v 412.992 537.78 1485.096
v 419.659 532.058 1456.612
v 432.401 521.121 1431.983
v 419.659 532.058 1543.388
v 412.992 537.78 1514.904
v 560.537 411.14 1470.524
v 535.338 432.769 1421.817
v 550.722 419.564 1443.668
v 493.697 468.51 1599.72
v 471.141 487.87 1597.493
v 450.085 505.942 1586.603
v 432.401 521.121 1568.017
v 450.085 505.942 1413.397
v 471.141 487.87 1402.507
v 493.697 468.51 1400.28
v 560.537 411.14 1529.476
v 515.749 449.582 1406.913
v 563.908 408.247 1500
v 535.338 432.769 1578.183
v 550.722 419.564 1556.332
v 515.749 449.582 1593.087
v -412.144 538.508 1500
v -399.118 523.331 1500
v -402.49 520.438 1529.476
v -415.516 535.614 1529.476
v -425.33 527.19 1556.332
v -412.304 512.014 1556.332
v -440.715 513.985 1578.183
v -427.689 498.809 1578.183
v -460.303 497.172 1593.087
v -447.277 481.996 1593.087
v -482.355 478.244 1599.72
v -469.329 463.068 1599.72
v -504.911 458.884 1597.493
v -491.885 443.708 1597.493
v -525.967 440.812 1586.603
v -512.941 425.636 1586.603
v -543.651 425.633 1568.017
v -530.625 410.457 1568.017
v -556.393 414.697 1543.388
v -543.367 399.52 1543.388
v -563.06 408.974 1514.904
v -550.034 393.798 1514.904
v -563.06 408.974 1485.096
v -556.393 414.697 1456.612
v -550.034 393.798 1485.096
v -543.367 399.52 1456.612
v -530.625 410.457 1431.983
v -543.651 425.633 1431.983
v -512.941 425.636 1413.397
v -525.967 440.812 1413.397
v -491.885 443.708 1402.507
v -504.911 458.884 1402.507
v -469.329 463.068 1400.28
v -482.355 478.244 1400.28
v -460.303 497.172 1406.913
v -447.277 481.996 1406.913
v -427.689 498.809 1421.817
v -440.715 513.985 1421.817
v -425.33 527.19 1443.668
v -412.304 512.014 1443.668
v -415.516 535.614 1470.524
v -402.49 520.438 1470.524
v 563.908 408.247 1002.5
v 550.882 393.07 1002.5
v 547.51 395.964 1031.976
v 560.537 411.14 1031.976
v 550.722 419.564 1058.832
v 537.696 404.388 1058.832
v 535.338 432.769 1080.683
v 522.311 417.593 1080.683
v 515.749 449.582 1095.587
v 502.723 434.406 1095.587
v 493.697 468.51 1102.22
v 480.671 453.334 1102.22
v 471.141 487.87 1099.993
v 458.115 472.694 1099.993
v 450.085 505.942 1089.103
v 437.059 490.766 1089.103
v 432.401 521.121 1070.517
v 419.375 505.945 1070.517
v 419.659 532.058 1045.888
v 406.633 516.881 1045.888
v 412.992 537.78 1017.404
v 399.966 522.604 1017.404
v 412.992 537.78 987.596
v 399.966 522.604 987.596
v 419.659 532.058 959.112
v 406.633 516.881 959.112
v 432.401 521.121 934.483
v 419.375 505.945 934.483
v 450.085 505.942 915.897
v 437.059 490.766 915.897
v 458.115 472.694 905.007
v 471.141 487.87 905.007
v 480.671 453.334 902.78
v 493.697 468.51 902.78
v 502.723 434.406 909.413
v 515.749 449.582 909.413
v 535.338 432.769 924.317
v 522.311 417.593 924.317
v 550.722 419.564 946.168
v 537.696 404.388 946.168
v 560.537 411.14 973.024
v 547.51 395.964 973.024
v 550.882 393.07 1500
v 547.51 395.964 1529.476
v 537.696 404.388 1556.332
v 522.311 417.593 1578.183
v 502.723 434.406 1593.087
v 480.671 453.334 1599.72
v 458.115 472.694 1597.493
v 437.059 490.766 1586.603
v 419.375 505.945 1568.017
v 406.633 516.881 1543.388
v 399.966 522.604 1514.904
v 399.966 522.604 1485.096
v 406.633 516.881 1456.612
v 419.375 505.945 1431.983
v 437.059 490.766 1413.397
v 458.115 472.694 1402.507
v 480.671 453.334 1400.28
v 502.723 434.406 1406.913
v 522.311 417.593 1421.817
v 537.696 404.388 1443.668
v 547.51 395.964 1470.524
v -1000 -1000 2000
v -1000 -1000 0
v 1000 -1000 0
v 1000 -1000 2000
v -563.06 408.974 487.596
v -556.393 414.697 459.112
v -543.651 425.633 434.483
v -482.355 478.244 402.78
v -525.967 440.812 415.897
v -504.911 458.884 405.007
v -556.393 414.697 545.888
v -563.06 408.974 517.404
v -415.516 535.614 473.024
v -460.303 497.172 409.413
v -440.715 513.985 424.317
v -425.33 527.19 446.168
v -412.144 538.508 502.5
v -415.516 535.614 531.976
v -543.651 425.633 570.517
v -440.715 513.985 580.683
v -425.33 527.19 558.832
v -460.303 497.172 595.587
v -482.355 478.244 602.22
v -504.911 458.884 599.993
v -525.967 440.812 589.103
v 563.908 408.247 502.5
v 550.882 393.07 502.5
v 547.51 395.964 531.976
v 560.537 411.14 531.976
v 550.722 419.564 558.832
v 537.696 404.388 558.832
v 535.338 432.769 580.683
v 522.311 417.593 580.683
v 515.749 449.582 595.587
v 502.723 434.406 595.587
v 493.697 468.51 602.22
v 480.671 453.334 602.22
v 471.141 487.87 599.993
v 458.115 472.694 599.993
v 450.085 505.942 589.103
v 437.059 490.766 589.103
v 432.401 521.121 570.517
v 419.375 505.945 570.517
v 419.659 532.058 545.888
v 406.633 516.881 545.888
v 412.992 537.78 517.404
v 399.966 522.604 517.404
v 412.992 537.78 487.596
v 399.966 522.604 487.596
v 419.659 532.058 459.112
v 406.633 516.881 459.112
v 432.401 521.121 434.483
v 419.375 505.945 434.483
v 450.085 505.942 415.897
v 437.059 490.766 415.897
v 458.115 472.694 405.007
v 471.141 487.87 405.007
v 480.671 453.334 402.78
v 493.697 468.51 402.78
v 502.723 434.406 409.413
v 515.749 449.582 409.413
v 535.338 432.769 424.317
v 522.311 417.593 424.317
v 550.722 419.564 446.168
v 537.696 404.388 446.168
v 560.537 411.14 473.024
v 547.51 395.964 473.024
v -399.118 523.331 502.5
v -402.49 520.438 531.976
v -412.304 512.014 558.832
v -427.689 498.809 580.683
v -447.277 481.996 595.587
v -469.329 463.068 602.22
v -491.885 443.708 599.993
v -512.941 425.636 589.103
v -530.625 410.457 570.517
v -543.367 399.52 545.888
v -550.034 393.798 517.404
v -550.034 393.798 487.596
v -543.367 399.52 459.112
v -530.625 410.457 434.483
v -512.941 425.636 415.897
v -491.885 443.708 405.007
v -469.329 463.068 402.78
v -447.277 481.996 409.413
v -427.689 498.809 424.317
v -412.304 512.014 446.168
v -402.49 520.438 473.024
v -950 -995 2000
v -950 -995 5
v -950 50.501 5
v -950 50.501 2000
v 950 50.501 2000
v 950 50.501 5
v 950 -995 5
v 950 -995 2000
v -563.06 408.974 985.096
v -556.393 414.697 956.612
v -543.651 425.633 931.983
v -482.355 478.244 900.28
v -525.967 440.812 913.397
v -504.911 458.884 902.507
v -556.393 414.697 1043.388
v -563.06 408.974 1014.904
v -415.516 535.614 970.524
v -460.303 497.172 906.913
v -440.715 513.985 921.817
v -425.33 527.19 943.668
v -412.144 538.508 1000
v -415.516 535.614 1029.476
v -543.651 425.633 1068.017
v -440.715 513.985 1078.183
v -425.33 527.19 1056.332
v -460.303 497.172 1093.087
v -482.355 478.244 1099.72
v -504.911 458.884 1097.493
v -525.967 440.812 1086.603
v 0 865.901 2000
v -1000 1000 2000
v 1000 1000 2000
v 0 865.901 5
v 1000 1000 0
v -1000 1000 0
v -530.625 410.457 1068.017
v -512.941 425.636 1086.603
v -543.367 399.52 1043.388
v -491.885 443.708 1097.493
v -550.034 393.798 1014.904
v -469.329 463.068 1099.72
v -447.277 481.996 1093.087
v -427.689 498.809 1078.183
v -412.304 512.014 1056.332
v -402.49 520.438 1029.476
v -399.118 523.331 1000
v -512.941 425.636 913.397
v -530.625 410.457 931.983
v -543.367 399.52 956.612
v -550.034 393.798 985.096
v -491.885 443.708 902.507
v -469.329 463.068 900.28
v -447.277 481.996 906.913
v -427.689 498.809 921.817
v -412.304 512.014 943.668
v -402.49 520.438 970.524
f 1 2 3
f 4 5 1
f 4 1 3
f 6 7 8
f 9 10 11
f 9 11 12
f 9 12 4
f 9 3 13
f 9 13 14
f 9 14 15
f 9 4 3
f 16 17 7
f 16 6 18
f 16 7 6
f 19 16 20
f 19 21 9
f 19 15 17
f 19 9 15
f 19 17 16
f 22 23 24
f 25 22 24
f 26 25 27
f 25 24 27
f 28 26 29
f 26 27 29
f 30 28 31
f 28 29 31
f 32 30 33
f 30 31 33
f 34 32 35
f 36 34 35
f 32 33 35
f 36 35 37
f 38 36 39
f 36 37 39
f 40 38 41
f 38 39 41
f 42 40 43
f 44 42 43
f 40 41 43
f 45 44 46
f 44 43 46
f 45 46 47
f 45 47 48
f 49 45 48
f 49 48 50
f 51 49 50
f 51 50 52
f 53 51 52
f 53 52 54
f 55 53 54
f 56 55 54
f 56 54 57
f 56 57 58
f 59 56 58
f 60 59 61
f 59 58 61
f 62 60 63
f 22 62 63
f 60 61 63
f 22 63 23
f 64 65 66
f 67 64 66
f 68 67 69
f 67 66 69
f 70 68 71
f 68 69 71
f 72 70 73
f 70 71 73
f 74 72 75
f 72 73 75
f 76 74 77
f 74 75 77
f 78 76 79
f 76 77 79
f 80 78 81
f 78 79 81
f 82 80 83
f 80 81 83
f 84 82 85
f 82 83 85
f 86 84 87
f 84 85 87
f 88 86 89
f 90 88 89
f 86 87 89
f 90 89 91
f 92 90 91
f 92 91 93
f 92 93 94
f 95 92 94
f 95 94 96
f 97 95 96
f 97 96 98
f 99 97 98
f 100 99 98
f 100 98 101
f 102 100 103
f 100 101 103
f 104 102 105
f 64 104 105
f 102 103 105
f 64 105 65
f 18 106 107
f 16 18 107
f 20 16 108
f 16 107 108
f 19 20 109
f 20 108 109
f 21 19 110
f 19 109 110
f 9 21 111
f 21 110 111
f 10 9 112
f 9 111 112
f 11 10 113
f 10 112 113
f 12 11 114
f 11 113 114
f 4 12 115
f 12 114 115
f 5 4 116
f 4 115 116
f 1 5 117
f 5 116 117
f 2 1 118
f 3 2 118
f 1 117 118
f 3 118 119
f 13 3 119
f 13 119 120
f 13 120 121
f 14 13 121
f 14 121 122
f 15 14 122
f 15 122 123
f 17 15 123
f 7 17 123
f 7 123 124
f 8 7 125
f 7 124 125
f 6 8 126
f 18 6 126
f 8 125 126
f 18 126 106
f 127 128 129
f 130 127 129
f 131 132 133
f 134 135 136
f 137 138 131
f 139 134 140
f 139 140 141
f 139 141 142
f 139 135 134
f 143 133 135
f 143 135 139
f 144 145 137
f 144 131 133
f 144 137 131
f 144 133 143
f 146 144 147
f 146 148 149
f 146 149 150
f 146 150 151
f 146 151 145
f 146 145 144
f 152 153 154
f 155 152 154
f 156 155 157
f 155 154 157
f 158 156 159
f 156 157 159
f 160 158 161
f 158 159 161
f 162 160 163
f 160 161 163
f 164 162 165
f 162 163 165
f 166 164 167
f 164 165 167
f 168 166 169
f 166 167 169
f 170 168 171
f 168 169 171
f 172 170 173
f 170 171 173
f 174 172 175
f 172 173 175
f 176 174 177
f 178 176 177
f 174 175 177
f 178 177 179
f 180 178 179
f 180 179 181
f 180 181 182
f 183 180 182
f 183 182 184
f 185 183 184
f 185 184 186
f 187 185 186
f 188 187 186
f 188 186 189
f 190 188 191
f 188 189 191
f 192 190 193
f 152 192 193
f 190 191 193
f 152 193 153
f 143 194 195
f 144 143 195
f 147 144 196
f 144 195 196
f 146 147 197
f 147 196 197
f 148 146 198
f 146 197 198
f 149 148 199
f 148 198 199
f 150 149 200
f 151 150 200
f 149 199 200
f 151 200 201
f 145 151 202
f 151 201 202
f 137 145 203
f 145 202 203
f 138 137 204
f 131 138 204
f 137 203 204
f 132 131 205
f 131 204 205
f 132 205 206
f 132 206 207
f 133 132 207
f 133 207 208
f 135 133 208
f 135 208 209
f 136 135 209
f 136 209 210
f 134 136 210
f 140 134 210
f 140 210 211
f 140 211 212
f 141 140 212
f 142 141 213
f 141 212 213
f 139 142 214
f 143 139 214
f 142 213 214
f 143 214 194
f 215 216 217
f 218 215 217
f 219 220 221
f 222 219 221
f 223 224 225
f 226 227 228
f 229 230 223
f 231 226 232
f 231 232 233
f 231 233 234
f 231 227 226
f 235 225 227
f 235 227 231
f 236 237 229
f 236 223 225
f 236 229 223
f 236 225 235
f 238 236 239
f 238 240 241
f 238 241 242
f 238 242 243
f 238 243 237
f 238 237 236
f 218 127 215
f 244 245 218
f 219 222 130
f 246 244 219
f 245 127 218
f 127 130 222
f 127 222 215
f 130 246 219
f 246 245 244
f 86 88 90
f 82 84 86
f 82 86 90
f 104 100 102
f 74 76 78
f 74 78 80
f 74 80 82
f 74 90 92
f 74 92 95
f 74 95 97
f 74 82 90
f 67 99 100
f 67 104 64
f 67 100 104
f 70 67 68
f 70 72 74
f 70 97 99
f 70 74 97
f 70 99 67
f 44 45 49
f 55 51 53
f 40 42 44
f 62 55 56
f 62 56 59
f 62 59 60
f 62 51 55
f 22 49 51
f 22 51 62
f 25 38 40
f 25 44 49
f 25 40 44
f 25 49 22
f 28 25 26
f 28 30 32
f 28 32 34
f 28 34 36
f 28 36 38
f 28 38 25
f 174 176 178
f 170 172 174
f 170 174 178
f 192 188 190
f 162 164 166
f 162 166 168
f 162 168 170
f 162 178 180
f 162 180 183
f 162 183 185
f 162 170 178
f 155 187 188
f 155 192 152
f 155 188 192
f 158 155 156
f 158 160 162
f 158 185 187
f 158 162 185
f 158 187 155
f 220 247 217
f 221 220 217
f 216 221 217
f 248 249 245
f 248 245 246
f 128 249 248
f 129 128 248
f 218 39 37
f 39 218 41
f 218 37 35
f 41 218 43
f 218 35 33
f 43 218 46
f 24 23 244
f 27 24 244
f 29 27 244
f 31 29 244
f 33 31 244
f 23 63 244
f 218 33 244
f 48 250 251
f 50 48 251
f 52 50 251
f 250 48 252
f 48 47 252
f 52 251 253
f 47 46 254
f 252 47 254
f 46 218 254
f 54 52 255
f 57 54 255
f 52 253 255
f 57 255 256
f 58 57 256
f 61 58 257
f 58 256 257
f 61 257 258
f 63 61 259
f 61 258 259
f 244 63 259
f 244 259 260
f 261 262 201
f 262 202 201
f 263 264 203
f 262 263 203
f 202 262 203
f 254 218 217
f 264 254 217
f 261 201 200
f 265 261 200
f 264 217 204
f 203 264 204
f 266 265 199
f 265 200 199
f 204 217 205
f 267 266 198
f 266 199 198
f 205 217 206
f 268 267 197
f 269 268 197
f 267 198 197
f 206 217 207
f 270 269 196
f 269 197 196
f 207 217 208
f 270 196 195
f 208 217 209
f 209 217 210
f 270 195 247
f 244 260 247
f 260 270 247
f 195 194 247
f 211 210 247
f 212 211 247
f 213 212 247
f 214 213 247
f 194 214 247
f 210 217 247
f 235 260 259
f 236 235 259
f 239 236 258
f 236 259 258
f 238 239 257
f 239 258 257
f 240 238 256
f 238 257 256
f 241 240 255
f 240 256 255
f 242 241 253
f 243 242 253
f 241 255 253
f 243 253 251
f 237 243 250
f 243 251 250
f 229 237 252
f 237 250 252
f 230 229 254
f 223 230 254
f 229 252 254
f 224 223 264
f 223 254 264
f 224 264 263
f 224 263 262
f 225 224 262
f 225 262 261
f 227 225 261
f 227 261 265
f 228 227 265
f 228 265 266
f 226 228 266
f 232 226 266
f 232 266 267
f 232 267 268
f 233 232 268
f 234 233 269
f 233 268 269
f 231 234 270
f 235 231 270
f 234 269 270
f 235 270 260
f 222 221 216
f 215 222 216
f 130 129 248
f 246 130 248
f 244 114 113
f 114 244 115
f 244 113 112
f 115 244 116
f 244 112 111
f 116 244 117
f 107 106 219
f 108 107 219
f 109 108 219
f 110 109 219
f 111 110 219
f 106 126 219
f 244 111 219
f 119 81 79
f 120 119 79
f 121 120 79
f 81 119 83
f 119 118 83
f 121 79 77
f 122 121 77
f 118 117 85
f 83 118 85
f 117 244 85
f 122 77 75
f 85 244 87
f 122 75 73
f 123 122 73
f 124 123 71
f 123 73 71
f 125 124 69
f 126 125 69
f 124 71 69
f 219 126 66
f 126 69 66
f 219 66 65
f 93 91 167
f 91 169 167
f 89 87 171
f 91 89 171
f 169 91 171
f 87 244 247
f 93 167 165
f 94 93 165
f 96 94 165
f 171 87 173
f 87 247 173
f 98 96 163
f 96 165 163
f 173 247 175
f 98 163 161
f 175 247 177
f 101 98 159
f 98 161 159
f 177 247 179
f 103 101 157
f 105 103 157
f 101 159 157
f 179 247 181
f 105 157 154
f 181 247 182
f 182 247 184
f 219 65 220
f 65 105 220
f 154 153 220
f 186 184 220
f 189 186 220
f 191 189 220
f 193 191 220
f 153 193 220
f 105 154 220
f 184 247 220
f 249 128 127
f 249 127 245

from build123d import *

# Parameters (mm, degrees)
SKETCH1_W               = 2000
SKETCH1_H               = 2000
BOSS_EXTRUDE1_DEPTH     = 2000
CUT_EXTRUDE4_DEPTH      = 2450.489742783
CUT_EXTRUDE4_DEPTH_BACK = 1995
SKETCH6_R               = 100
CUT_EXTRUDE5_DEPTH      = 20
SKETCH3_R               = 100
CUT_EXTRUDE6_DEPTH      = 20


with BuildPart() as part:
    # Sketch1 → Boss-Extrude1 (new body)
    with BuildSketch(Plane.XY):
        Rectangle(SKETCH1_W, SKETCH1_H)
    extrude(amount=BOSS_EXTRUDE1_DEPTH)

    # Sketch2 → Cut-Extrude4 (cut, two sides: drawn at the far end of the back side and taken through both)
    with BuildSketch(Plane.XY.offset(2000).offset(-CUT_EXTRUDE4_DEPTH_BACK)):
        Polygon((-950, -995), (-950, 50.500700421), (0, 865.900952839), (950, 50.500700421), (950, -995), align=None)
    extrude(amount=CUT_EXTRUDE4_DEPTH + CUT_EXTRUDE4_DEPTH_BACK, mode=Mode.SUBTRACT)

    # Sketch6 → Cut-Extrude5 (cut)
    with BuildSketch(Plane(origin=(427.946064097, 498.587975275, 0), x_dir=(0.7588165446031105, -0.6513044231667675, 0), z_dir=(-0.6513044231667675, -0.7588165446031105, 0))):
        with Locations((62.009633604, 1500)):
            Circle(SKETCH6_R)
        with Locations((62.009633604, 1002.5)):
            Circle(SKETCH6_R)
        with Locations((62.009633604, 502.5)):
            Circle(SKETCH6_R)
    extrude(amount=-CUT_EXTRUDE5_DEPTH, mode=Mode.SUBTRACT)

    # Sketch3 → Cut-Extrude6 (cut)
    with BuildSketch(Plane(origin=(-427.946064097, 498.587975275, 0), x_dir=(0.7588165446031103, 0.6513044231667675, 0), z_dir=(0.6513044231667675, -0.7588165446031103, 0))):
        with Locations((-62.009633604, 1500)):
            Circle(SKETCH3_R)
        with Locations((-62.009633604, 1000)):
            Circle(SKETCH3_R)
        with Locations((-62.009633604, 502.5)):
            Circle(SKETCH3_R)
    extrude(amount=-CUT_EXTRUDE6_DEPTH, mode=Mode.SUBTRACT)


solid = part.part
